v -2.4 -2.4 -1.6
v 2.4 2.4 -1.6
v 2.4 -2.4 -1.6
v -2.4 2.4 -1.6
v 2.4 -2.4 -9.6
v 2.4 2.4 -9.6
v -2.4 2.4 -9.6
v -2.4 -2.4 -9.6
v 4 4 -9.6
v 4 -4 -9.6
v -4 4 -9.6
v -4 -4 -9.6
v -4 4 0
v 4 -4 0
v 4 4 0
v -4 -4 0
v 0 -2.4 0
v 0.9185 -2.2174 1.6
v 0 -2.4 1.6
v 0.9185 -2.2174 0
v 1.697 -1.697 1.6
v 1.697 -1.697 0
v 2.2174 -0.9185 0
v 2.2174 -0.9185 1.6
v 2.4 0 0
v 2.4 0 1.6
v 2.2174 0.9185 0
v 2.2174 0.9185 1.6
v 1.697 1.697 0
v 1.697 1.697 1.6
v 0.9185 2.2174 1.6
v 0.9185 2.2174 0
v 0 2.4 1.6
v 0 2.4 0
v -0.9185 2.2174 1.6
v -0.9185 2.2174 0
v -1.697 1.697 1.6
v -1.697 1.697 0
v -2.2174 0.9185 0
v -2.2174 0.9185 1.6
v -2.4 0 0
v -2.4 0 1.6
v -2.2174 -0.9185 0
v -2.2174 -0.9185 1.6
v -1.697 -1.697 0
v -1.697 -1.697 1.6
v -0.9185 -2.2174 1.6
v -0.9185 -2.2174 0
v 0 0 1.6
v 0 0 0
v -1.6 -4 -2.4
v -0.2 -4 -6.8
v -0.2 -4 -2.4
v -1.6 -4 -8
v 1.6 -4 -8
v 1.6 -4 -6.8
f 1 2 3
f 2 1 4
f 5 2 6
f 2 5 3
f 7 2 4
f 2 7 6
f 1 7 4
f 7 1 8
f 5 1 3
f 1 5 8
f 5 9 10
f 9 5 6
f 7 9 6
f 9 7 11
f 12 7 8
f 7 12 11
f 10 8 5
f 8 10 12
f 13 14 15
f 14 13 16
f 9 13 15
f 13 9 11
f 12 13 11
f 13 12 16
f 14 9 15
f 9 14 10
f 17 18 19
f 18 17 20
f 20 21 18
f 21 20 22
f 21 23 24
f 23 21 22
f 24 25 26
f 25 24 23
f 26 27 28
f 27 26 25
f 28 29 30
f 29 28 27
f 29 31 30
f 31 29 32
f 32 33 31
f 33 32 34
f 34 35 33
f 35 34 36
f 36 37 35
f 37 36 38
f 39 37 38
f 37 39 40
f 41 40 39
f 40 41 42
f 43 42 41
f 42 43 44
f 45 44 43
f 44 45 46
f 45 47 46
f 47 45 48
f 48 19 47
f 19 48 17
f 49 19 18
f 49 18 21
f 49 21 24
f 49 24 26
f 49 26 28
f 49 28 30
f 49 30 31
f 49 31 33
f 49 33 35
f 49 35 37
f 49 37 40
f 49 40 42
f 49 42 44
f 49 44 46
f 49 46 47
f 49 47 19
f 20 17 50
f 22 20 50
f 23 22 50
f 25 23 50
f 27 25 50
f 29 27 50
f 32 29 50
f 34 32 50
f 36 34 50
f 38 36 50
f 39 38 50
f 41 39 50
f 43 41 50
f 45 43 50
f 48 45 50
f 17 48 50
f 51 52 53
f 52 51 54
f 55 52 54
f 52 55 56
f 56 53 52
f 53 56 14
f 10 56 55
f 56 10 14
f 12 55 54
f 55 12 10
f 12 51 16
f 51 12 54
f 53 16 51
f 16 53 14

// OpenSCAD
// file: ../p/4-4edge.scad
use <../lib.scad>
function ldraw_lib__4_4edge() = [
// 0 Circle 1.0
// 0 Name: 4-4edge.dat
// 0 Author: James Jessiman
// 0 !LDRAW_ORG Primitive UPDATE 2017-01
// 0 !LICENSE Licensed under CC BY 2.0 and CC BY 4.0 : see CAreadme.txt
// 
// 0 BFC CERTIFY CCW
  [0,"BFC","CERTIFY"],
  [0,"BFC","CCW"],
// 
// 0 !HISTORY 1998-12-15 [PTadmin] Official Update 1998-10
// 0 !HISTORY 2005-12-28 [PTadmin] Official Update 2005-01
// 0 !HISTORY 2007-06-24 [PTadmin] Header formatted for Contributor Agreement
// 0 !HISTORY 2008-07-01 [PTadmin] Official Update 2008-01
// 0 !HISTORY 2017-01-15 [Steffen] BFCed
// 0 !HISTORY 2017-12-30 [PTadmin] Official Update 2017-01
// 
// 
// 2 24 1 0 0 0.9239 0 0.3827
  [2,24,1,0,0,0.9239,0,0.3827],
// 2 24 0.9239 0 0.3827 0.7071 0 0.7071
  [2,24,0.9239,0,0.3827,0.7071,0,0.7071],
// 2 24 0.7071 0 0.7071 0.3827 0 0.9239
  [2,24,0.7071,0,0.7071,0.3827,0,0.9239],
// 2 24 0.3827 0 0.9239 0 0 1
  [2,24,0.3827,0,0.9239,0,0,1],
// 2 24 0 0 1 -0.3827 0 0.9239
  [2,24,0,0,1,-0.3827,0,0.9239],
// 2 24 -0.3827 0 0.9239 -0.7071 0 0.7071
  [2,24,-0.3827,0,0.9239,-0.7071,0,0.7071],
// 2 24 -0.7071 0 0.7071 -0.9239 0 0.3827
  [2,24,-0.7071,0,0.7071,-0.9239,0,0.3827],
// 2 24 -0.9239 0 0.3827 -1 0 -0
  [2,24,-0.9239,0,0.3827,-1,0,-0],
// 2 24 -1 0 -0 -0.9239 0 -0.3827
  [2,24,-1,0,-0,-0.9239,0,-0.3827],
// 2 24 -0.9239 0 -0.3827 -0.7071 0 -0.7071
  [2,24,-0.9239,0,-0.3827,-0.7071,0,-0.7071],
// 2 24 -0.7071 0 -0.7071 -0.3827 0 -0.9239
  [2,24,-0.7071,0,-0.7071,-0.3827,0,-0.9239],
// 2 24 -0.3827 0 -0.9239 0 0 -1
  [2,24,-0.3827,0,-0.9239,0,0,-1],
// 2 24 0 0 -1 0.3827 0 -0.9239
  [2,24,0,0,-1,0.3827,0,-0.9239],
// 2 24 0.3827 0 -0.9239 0.7071 0 -0.7071
  [2,24,0.3827,0,-0.9239,0.7071,0,-0.7071],
// 2 24 0.7071 0 -0.7071 0.9239 0 -0.3827
  [2,24,0.7071,0,-0.7071,0.9239,0,-0.3827],
// 2 24 0.9239 0 -0.3827 1 0 0
  [2,24,0.9239,0,-0.3827,1,0,0],
];
module ldraw_lib__4_4edge(step=0, col=false, unit=2/5, alt=false, line=0.2, solid=!$preview)
    makepoly(ldraw_lib__4_4edge(), step=step, col=col, unit=unit, alt=alt, line=line, solid=solid);
ldraw_lib__4_4edge(line=0.2);
// file: ../p/4-4disc.scad
use <../lib.scad>
function ldraw_lib__4_4disc() = [
// 0 Disc 1.0
// 0 Name: 4-4disc.dat
// 0 Author: James Jessiman
// 0 !LDRAW_ORG Primitive UPDATE 2002-02
// 0 !LICENSE Licensed under CC BY 2.0 and CC BY 4.0 : see CAreadme.txt
// 
// 0 BFC CERTIFY CCW
  [0,"BFC","CERTIFY"],
  [0,"BFC","CCW"],
// 
// 0 !HISTORY 1998-12-15 [PTadmin] Official Update 1998-10
// 0 !HISTORY 2002-03-23 [sbliss] Added BFC statement
// 0 !HISTORY 2002-04-25 [PTadmin] Official Update 2002-02
// 0 !HISTORY 2007-06-24 [PTadmin] Header formatted for Contributor Agreement
// 0 !HISTORY 2008-07-01 [PTadmin] Official Update 2008-01
// 
// 
// 3 16 0 0 0 1 0 0 0.9239 0 0.3827
  [3,16,0,0,0,1,0,0,0.9239,0,0.3827],
// 3 16 0 0 0 0.9239 0 0.3827 0.7071 0 0.7071
  [3,16,0,0,0,0.9239,0,0.3827,0.7071,0,0.7071],
// 3 16 0 0 0 0.7071 0 0.7071 0.3827 0 0.9239
  [3,16,0,0,0,0.7071,0,0.7071,0.3827,0,0.9239],
// 3 16 0 0 0 0.3827 0 0.9239 0 0 1
  [3,16,0,0,0,0.3827,0,0.9239,0,0,1],
// 3 16 0 0 0 0 0 1 -0.3827 0 0.9239
  [3,16,0,0,0,0,0,1,-0.3827,0,0.9239],
// 3 16 0 0 0 -0.3827 0 0.9239 -0.7071 0 0.7071
  [3,16,0,0,0,-0.3827,0,0.9239,-0.7071,0,0.7071],
// 3 16 0 0 0 -0.7071 0 0.7071 -0.9239 0 0.3827
  [3,16,0,0,0,-0.7071,0,0.7071,-0.9239,0,0.3827],
// 3 16 0 0 0 -0.9239 0 0.3827 -1 0 -0
  [3,16,0,0,0,-0.9239,0,0.3827,-1,0,-0],
// 3 16 0 0 0 -1 0 -0 -0.9239 0 -0.3827
  [3,16,0,0,0,-1,0,-0,-0.9239,0,-0.3827],
// 3 16 0 0 0 -0.9239 0 -0.3827 -0.7071 0 -0.7071
  [3,16,0,0,0,-0.9239,0,-0.3827,-0.7071,0,-0.7071],
// 3 16 0 0 0 -0.7071 0 -0.7071 -0.3827 0 -0.9239
  [3,16,0,0,0,-0.7071,0,-0.7071,-0.3827,0,-0.9239],
// 3 16 0 0 0 -0.3827 0 -0.9239 0 0 -1
  [3,16,0,0,0,-0.3827,0,-0.9239,0,0,-1],
// 3 16 0 0 0 0 0 -1 0.3827 0 -0.9239
  [3,16,0,0,0,0,0,-1,0.3827,0,-0.9239],
// 3 16 0 0 0 0.3827 0 -0.9239 0.7071 0 -0.7071
  [3,16,0,0,0,0.3827,0,-0.9239,0.7071,0,-0.7071],
// 3 16 0 0 0 0.7071 0 -0.7071 0.9239 0 -0.3827
  [3,16,0,0,0,0.7071,0,-0.7071,0.9239,0,-0.3827],
// 3 16 0 0 0 0.9239 0 -0.3827 1 0 0
  [3,16,0,0,0,0.9239,0,-0.3827,1,0,0],
// 0
];
module ldraw_lib__4_4disc(step=0, col=false, unit=2/5, alt=false, line=0.2, solid=!$preview)
    makepoly(ldraw_lib__4_4disc(), step=step, col=col, unit=unit, alt=alt, line=line, solid=solid);
ldraw_lib__4_4disc(line=0.2);
// file: ../p/4-4cyli.scad
use <../lib.scad>
$fa=1; $fs=0.2;
function ldraw_lib__4_4cyli(realsolid=false) = [
// 0 Cylinder 1.0
// 0 Name: 4-4cyli.dat
// 0 Author: James Jessiman
// 0 !LDRAW_ORG Primitive UPDATE 2005-01
// 0 !LICENSE Licensed under CC BY 2.0 and CC BY 4.0 : see CAreadme.txt
// 
// 0 BFC CERTIFY CCW
  [0,"BFC","CERTIFY"],
  [0,"BFC","CCW"],
// 
// 0 !HISTORY 1998-12-15 [PTadmin] Official Update 1998-10
// 0 !HISTORY 2002-03-23 [sbliss] Added BFC statement; merged headers from files in distributions LDraw 0.27 and Complete.
// 0 !HISTORY 2002-04-25 [PTadmin] Official Update 2002-02
// 0 !HISTORY 2004-12-14 [guyvivan] BFC CCW
// 0 !HISTORY 2005-12-28 [PTadmin] Official Update 2005-01
// 0 !HISTORY 2007-06-24 [PTadmin] Header formatted for Contributor Agreement
// 0 !HISTORY 2008-07-01 [PTadmin] Official Update 2008-01
// 
// 
// 4 16 1 1 0 0.9239 1 0.3827 0.9239 0 0.3827 1 0 0
  [4,16,1,1,0,0.9239,1,0.3827,0.9239,0,0.3827,1,0,0],
// 5 24 1 0 0 1 1 0 0.9239 0 0.3827 0.9239 0 -0.3827
  [5,24,1,0,0,1,1,0,0.9239,0,0.3827,0.9239,0,-0.3827],
// 4 16 0.9239 1 0.3827 0.7071 1 0.7071 0.7071 0 0.7071 0.9239 0 0.3827
  [4,16,0.9239,1,0.3827,0.7071,1,0.7071,0.7071,0,0.7071,0.9239,0,0.3827],
// 5 24 0.9239 0 0.3827 0.9239 1 0.3827 0.7071 0 0.7071 1 0 0
  [5,24,0.9239,0,0.3827,0.9239,1,0.3827,0.7071,0,0.7071,1,0,0],
// 4 16 0.7071 1 0.7071 0.3827 1 0.9239 0.3827 0 0.9239 0.7071 0 0.7071
  [4,16,0.7071,1,0.7071,0.3827,1,0.9239,0.3827,0,0.9239,0.7071,0,0.7071],
// 5 24 0.7071 0 0.7071 0.7071 1 0.7071 0.3827 0 0.9239 0.9239 0 0.3827
  [5,24,0.7071,0,0.7071,0.7071,1,0.7071,0.3827,0,0.9239,0.9239,0,0.3827],
// 4 16 0.3827 1 0.9239 0 1 1 0 0 1 0.3827 0 0.9239
  [4,16,0.3827,1,0.9239,0,1,1,0,0,1,0.3827,0,0.9239],
// 5 24 0.3827 0 0.9239 0.3827 1 0.9239 0 0 1 0.7071 0 0.7071
  [5,24,0.3827,0,0.9239,0.3827,1,0.9239,0,0,1,0.7071,0,0.7071],
// 4 16 0 1 1 -0.3827 1 0.9239 -0.3827 0 0.9239 0 0 1
  [4,16,0,1,1,-0.3827,1,0.9239,-0.3827,0,0.9239,0,0,1],
// 5 24 0 0 1 0 1 1 -0.3827 0 0.9239 0.3827 0 0.9239
  [5,24,0,0,1,0,1,1,-0.3827,0,0.9239,0.3827,0,0.9239],
// 4 16 -0.3827 1 0.9239 -0.7071 1 0.7071 -0.7071 0 0.7071 -0.3827 0 0.9239
  [4,16,-0.3827,1,0.9239,-0.7071,1,0.7071,-0.7071,0,0.7071,-0.3827,0,0.9239],
// 5 24 -0.3827 0 0.9239 -0.3827 1 0.9239 -0.7071 0 0.7071 0 0 1
  [5,24,-0.3827,0,0.9239,-0.3827,1,0.9239,-0.7071,0,0.7071,0,0,1],
// 4 16 -0.7071 1 0.7071 -0.9239 1 0.3827 -0.9239 0 0.3827 -0.7071 0 0.7071
  [4,16,-0.7071,1,0.7071,-0.9239,1,0.3827,-0.9239,0,0.3827,-0.7071,0,0.7071],
// 5 24 -0.7071 0 0.7071 -0.7071 1 0.7071 -0.9239 0 0.3827 -0.3827 0 0.9239
  [5,24,-0.7071,0,0.7071,-0.7071,1,0.7071,-0.9239,0,0.3827,-0.3827,0,0.9239],
// 4 16 -0.9239 1 0.3827 -1 1 0 -1 0 0 -0.9239 0 0.3827
  [4,16,-0.9239,1,0.3827,-1,1,0,-1,0,0,-0.9239,0,0.3827],
// 5 24 -0.9239 0 0.3827 -0.9239 1 0.3827 -1 0 0 -0.7071 0 0.7071
  [5,24,-0.9239,0,0.3827,-0.9239,1,0.3827,-1,0,0,-0.7071,0,0.7071],
// 4 16 -1 1 0 -0.9239 1 -0.3827 -0.9239 0 -0.3827 -1 0 0
  [4,16,-1,1,0,-0.9239,1,-0.3827,-0.9239,0,-0.3827,-1,0,0],
// 5 24 -1 0 0 -1 1 0 -0.9239 0 -0.3827 -0.9239 0 0.3827
  [5,24,-1,0,0,-1,1,0,-0.9239,0,-0.3827,-0.9239,0,0.3827],
// 4 16 -0.9239 1 -0.3827 -0.7071 1 -0.7071 -0.7071 0 -0.7071 -0.9239 0 -0.3827
  [4,16,-0.9239,1,-0.3827,-0.7071,1,-0.7071,-0.7071,0,-0.7071,-0.9239,0,-0.3827],
// 5 24 -0.9239 0 -0.3827 -0.9239 1 -0.3827 -0.7071 0 -0.7071 -1 0 0
  [5,24,-0.9239,0,-0.3827,-0.9239,1,-0.3827,-0.7071,0,-0.7071,-1,0,0],
// 4 16 -0.7071 1 -0.7071 -0.3827 1 -0.9239 -0.3827 0 -0.9239 -0.7071 0 -0.7071
  [4,16,-0.7071,1,-0.7071,-0.3827,1,-0.9239,-0.3827,0,-0.9239,-0.7071,0,-0.7071],
// 5 24 -0.7071 0 -0.7071 -0.7071 1 -0.7071 -0.3827 0 -0.9239 -0.9239 0 -0.3827
  [5,24,-0.7071,0,-0.7071,-0.7071,1,-0.7071,-0.3827,0,-0.9239,-0.9239,0,-0.3827],
// 4 16 -0.3827 1 -0.9239 0 1 -1 0 0 -1 -0.3827 0 -0.9239
  [4,16,-0.3827,1,-0.9239,0,1,-1,0,0,-1,-0.3827,0,-0.9239],
// 5 24 -0.3827 0 -0.9239 -0.3827 1 -0.9239 0 0 -1 -0.7071 0 -0.7071
  [5,24,-0.3827,0,-0.9239,-0.3827,1,-0.9239,0,0,-1,-0.7071,0,-0.7071],
// 4 16 0 1 -1 0.3827 1 -0.9239 0.3827 0 -0.9239 0 0 -1
  [4,16,0,1,-1,0.3827,1,-0.9239,0.3827,0,-0.9239,0,0,-1],
// 5 24 0 0 -1 0 1 -1 0.3827 0 -0.9239 -0.3827 0 -0.9239
  [5,24,0,0,-1,0,1,-1,0.3827,0,-0.9239,-0.3827,0,-0.9239],
// 4 16 0.3827 1 -0.9239 0.7071 1 -0.7071 0.7071 0 -0.7071 0.3827 0 -0.9239
  [4,16,0.3827,1,-0.9239,0.7071,1,-0.7071,0.7071,0,-0.7071,0.3827,0,-0.9239],
// 5 24 0.3827 0 -0.9239 0.3827 1 -0.9239 0.7071 0 -0.7071 0 0 -1
  [5,24,0.3827,0,-0.9239,0.3827,1,-0.9239,0.7071,0,-0.7071,0,0,-1],
// 4 16 0.7071 1 -0.7071 0.9239 1 -0.3827 0.9239 0 -0.3827 0.7071 0 -0.7071
  [4,16,0.7071,1,-0.7071,0.9239,1,-0.3827,0.9239,0,-0.3827,0.7071,0,-0.7071],
// 5 24 0.7071 0 -0.7071 0.7071 1 -0.7071 0.9239 0 -0.3827 0.3827 0 -0.9239
  [5,24,0.7071,0,-0.7071,0.7071,1,-0.7071,0.9239,0,-0.3827,0.3827,0,-0.9239],
// 4 16 0.9239 1 -0.3827 1 1 0 1 0 0 0.9239 0 -0.3827
  [4,16,0.9239,1,-0.3827,1,1,0,1,0,0,0.9239,0,-0.3827],
// 5 24 0.9239 0 -0.3827 0.9239 1 -0.3827 1 0 0 0.7071 0 -0.7071
  [5,24,0.9239,0,-0.3827,0.9239,1,-0.3827,1,0,0,0.7071,0,-0.7071],
// 0
];
module ldraw_lib__4_4cyli(step=0, col=false, unit=2/5, alt=false, line=0.2, solid=!$preview)
    makepoly(ldraw_lib__4_4cyli(solid), step=step, col=col, unit=unit, alt=alt, line=line, solid=solid);
ldraw_lib__4_4cyli(line=0.2);
// file: ../p/stud.scad
use <../lib.scad>
use <4-4cyli.scad>
use <4-4disc.scad>
use <4-4edge.scad>
function ldraw_lib__stud() = [
// 0 Stud
// 0 Name: stud.dat
// 0 Author: James Jessiman
// 0 !LDRAW_ORG Primitive UPDATE 2012-01
// 0 !LICENSE Licensed under CC BY 4.0 : see CAreadme.txt
// 
// 0 BFC CERTIFY CCW
  [0,"BFC","CERTIFY"],
  [0,"BFC","CCW"],
// 
// 0 !HISTORY 2002-04-04 [sbliss] Modified for BFC compliance
// 0 !HISTORY 2002-04-25 [PTadmin] Official Update 2002-02
// 0 !HISTORY 2007-06-24 [PTadmin] Header formatted for Contributor Agreement
// 0 !HISTORY 2008-07-01 [PTadmin] Official Update 2008-01
// 0 !HISTORY 2012-02-16 [Philo] Changed to CCW
// 0 !HISTORY 2012-03-30 [PTadmin] Official Update 2012-01
// 
// 
// 1 16 0 0 0 6 0 0 0 1 0 0 0 6 4-4edge.dat
  [1,16,0,0,0,6,0,0,0,1,0,0,0,6, ldraw_lib__4_4edge()],
// 1 16 0 -4 0 6 0 0 0 1 0 0 0 6 4-4edge.dat
  [1,16,0,-4,0,6,0,0,0,1,0,0,0,6, ldraw_lib__4_4edge()],
// 1 16 0 0 0 6 0 0 0 -4 0 0 0 6 4-4cyli.dat
  [1,16,0,0,0,6,0,0,0,-4,0,0,0,6, ldraw_lib__4_4cyli()],
// 1 16 0 -4 0 6 0 0 0 1 0 0 0 6 4-4disc.dat
  [1,16,0,-4,0,6,0,0,0,1,0,0,0,6, ldraw_lib__4_4disc()],
  [-1,16,0,0,0,6,0,0,0,-1,0,0,0,6, ldraw_lib__4_4disc()],
];
module ldraw_lib__stud(step=0, col=false, unit=2/5, alt=false, line=0.2, solid=!$preview)
    makepoly(ldraw_lib__stud(), step=step, col=col, unit=unit, alt=alt, line=line, solid=solid);
ldraw_lib__stud(line=0.2);
// file: ../p/box5.scad
use <../lib.scad>
function ldraw_lib__box5() = [
// 0 Box with 5 Faces and All Edges
// 0 Name: box5.dat
// 0 Author: James Jessiman
// 0 !LDRAW_ORG Primitive UPDATE 2012-01
// 0 !LICENSE Licensed under CC BY 2.0 and CC BY 4.0 : see CAreadme.txt
// 
// 0 BFC CERTIFY CCW
  [0,"BFC","CERTIFY"],
  [0,"BFC","CCW"],
// 
// 0 !HISTORY 2002-04-03 [sbliss] Modified for BFC compliance
// 0 !HISTORY 2002-04-25 [PTadmin] Official Update 2002-02
// 0 !HISTORY 2007-06-24 [PTadmin] Header formatted for Contributor Agreement
// 0 !HISTORY 2008-07-01 [PTadmin] Official Update 2008-01
// 0 !HISTORY 2012-02-16 [Philo] Changed to CCW
// 0 !HISTORY 2012-03-30 [PTadmin] Official Update 2012-01
// 
// 
// 2 24 1 1 1 -1 1 1
  [2,24,1,1,1,-1,1,1],
// 2 24 -1 1 1 -1 1 -1
  [2,24,-1,1,1,-1,1,-1],
// 2 24 -1 1 -1 1 1 -1
  [2,24,-1,1,-1,1,1,-1],
// 2 24 1 1 -1 1 1 1
  [2,24,1,1,-1,1,1,1],
// 2 24 1 0 1 -1 0 1
  [2,24,1,0,1,-1,0,1],
// 2 24 -1 0 1 -1 0 -1
  [2,24,-1,0,1,-1,0,-1],
// 2 24 -1 0 -1 1 0 -1
  [2,24,-1,0,-1,1,0,-1],
// 2 24 1 0 -1 1 0 1
  [2,24,1,0,-1,1,0,1],
// 2 24 1 0 1 1 1 1
  [2,24,1,0,1,1,1,1],
// 2 24 -1 0 1 -1 1 1
  [2,24,-1,0,1,-1,1,1],
// 2 24 1 0 -1 1 1 -1
  [2,24,1,0,-1,1,1,-1],
// 2 24 -1 0 -1 -1 1 -1
  [2,24,-1,0,-1,-1,1,-1],
// 4 16 -1 1 1 1 1 1 1 1 -1 -1 1 -1
  [4,16,-1,1,1,1,1,1,1,1,-1,-1,1,-1],
// 4 16 -1 1 1 -1 0 1 1 0 1 1 1 1
  [4,16,-1,1,1,-1,0,1,1,0,1,1,1,1],
// 4 16 -1 1 -1 -1 0 -1 -1 0 1 -1 1 1
  [4,16,-1,1,-1,-1,0,-1,-1,0,1,-1,1,1],
// 4 16 1 1 -1 1 0 -1 -1 0 -1 -1 1 -1
  [4,16,1,1,-1,1,0,-1,-1,0,-1,-1,1,-1],
// 4 16 1 1 1 1 0 1 1 0 -1 1 1 -1
  [4,16,1,1,1,1,0,1,1,0,-1,1,1,-1],
];
makepoly(ldraw_lib__box5(), line=0.2);
// file: ../p/box4t.scad
use <../lib.scad>
function ldraw_lib__box4t() = [
// 0 Box with 4 Adjacent Faces and All Edges
// 0 Name: box4t.dat
// 0 Author: Tore Eriksson [Tore_Eriksson]
// 0 !LDRAW_ORG Primitive UPDATE 2003-02
// 0 !LICENSE Licensed under CC BY 2.0 and CC BY 4.0 : see CAreadme.txt
// 
// 0 BFC CERTIFY CCW
  [0,"BFC","CERTIFY"],
  [0,"BFC","CCW"],
// 
// 0 !HISTORY 1997-09-29 [PTadmin] Official Update 1997-15
// 0 !HISTORY 2002-08-31 [izanette] Modified with WINDZ for BFC compliance
// 0 !HISTORY 2003-08-01 [PTadmin] Official Update 2003-02
// 0 !HISTORY 2007-06-24 [PTadmin] Header formatted for Contributor Agreement
// 0 !HISTORY 2008-07-01 [PTadmin] Official Update 2008-01
// 
// 
// 2 24 1 1 1 -1 1 1
  [2,24,1,1,1,-1,1,1],
// 2 24 -1 1 1 -1 1 -1
  [2,24,-1,1,1,-1,1,-1],
// 2 24 -1 1 -1 1 1 -1
  [2,24,-1,1,-1,1,1,-1],
// 2 24 1 1 -1 1 1 1
  [2,24,1,1,-1,1,1,1],
// 2 24 1 0 1 -1 0 1
  [2,24,1,0,1,-1,0,1],
// 2 24 -1 0 1 -1 0 -1
  [2,24,-1,0,1,-1,0,-1],
// 2 24 -1 0 -1 1 0 -1
  [2,24,-1,0,-1,1,0,-1],
// 2 24 1 0 -1 1 0 1
  [2,24,1,0,-1,1,0,1],
// 2 24 1 0 1 1 1 1
  [2,24,1,0,1,1,1,1],
// 2 24 -1 0 1 -1 1 1
  [2,24,-1,0,1,-1,1,1],
// 2 24 1 0 -1 1 1 -1
  [2,24,1,0,-1,1,1,-1],
// 2 24 -1 0 -1 -1 1 -1
  [2,24,-1,0,-1,-1,1,-1],
// 4 16 1 1 1 1 1 -1 -1 1 -1 -1 1 1
  [4,16,1,1,1,1,1,-1,-1,1,-1,-1,1,1],
// 4 16 1 1 1 -1 1 1 -1 0 1 1 0 1
  [4,16,1,1,1,-1,1,1,-1,0,1,1,0,1],
// 4 16 -1 1 1 -1 1 -1 -1 0 -1 -1 0 1
  [4,16,-1,1,1,-1,1,-1,-1,0,-1,-1,0,1],
// 0 4 16 -1 1 -1 -1 0 -1 1 0 -1 1 1 -1
// 4 16 1 1 -1 1 1 1 1 0 1 1 0 -1
  [4,16,1,1,-1,1,1,1,1,0,1,1,0,-1],
// 0
];
makepoly(ldraw_lib__box4t(), line=0.2);
// file: s/3005s01.scad
use <../../lib.scad>
use <../../p/box4t.scad>
use <../../p/box5.scad>
use <../../p/stud.scad>
function ldraw_lib__s__3005s01() = [
// 0 ~Brick  1 x  1 without Front Face
// 0 Name: s\3005s01.dat
// 0 Author: John Riley [jriley]
// 0 !LDRAW_ORG Subpart UPDATE 2004-01
// 0 !LICENSE Licensed under CC BY 2.0 and CC BY 4.0 : see CAreadme.txt
// 
// 0 BFC CERTIFY CCW
  [0,"BFC","CERTIFY"],
  [0,"BFC","CCW"],
// 
// 0 !HISTORY 2003-09-07 [jriley] BFCed & Subfiled
// 0 !HISTORY 2004-03-02 [PTadmin] Official Update 2004-01
// 0 !HISTORY 2007-08-29 [PTadmin] Header formatted for Contributor Agreement
// 0 !HISTORY 2008-07-01 [PTadmin] Official Update 2008-01
// 
// 
// 0 BFC INVERTNEXT
  [0,"BFC","INVERTNEXT"],
// 1 16 0 24 0 0 0 6 0 -20 0 -6 0 0 box5.dat
  [1,16,0,24,0,0,0,6,0,-20,0,-6,0,0, ldraw_lib__box5()],
// 4 16 10 24 -10 6 24 -6 6 24 6 10 24 10
  [4,16,10,24,-10,6,24,-6,6,24,6,10,24,10],
// 4 16 10 24 10 6 24 6 -6 24 6 -10 24 10
  [4,16,10,24,10,6,24,6,-6,24,6,-10,24,10],
// 4 16 -10 24 10 -6 24 6 -6 24 -6 -10 24 -10
  [4,16,-10,24,10,-6,24,6,-6,24,-6,-10,24,-10],
// 4 16 -10 24 -10 -6 24 -6 6 24 -6 10 24 -10
  [4,16,-10,24,-10,-6,24,-6,6,24,-6,10,24,-10],
// 1 16 0 24 0 10 0 0 0 -24 0 0 0 10 box4t.dat
  [1,16,0,24,0,10,0,0,0,-24,0,0,0,10, ldraw_lib__box4t()],
// 1 16 0 0 0 0 0 1 0 1 0 -1 0 0 stud.dat
  [1,16,0,0,0,0,0,1,0,1,0,-1,0,0, ldraw_lib__stud()],
// 0
];
module ldraw_lib__s__3005s01(step=0, col=false, unit=2/5, alt=false, line=0.2, solid=!$preview)
    makepoly(ldraw_lib__s__3005s01(), step=step, col=col, unit=unit, alt=alt, line=line, solid=solid);
ldraw_lib__s__3005s01(line=0.2);
// main file
use <../lib.scad>
use <s/3005s01.scad>
function ldraw_lib__3005pvl() = [
// 0 Brick  1 x  1 with Lightblue "L" Pattern
// 0 Name: 3005pvl.dat
// 0 Author: Tore Eriksson [Tore_Eriksson]
// 0 !LDRAW_ORG Part UPDATE 2025-09
// 0 !LICENSE Licensed under CC BY 4.0 : see CAreadme.txt
// 
// 0 BFC CERTIFY CCW
  [0,"BFC","CERTIFY"],
  [0,"BFC","CCW"],
// 
// 0 !KEYWORDS BrickLink 3005ptLb, letters, numbers, Rebrickable 3005pr9934
// 0 !KEYWORDS Set 988
// 
// 0 !HISTORY 2004-04-22 [PTadmin] Official Update 2004-02
// 0 !HISTORY 2007-05-11 [PTadmin] Header formatted for Contributor Agreement
// 0 !HISTORY 2008-07-01 [PTadmin] Official Update 2008-01
// 0 !HISTORY 2025-09-27 [OrionP] Changed winding to CCW
// 0 !HISTORY 2025-09-29 [OrionP] Official Update 2025-09
// 
// 1 16 0 0 0 1 0 0 0 1 0 0 0 1 s\3005s01.dat
  [1,16,0,0,0,1,0,0,0,1,0,0,0,1, ldraw_lib__s__3005s01()],
// 
// 4 9 -4 20 -10 -0.5 17 -10 -0.5 6 -10 -4 6 -10
  [4,9,-4,20,-10,-0.5,17,-10,-0.5,6,-10,-4,6,-10],
// 4 9 4 20 -10 4 17 -10 -0.5 17 -10 -4 20 -10
  [4,9,4,20,-10,4,17,-10,-0.5,17,-10,-4,20,-10],
// 4 16 -0.5 17 -10 4 17 -10 10 0 -10 -0.5 6 -10
  [4,16,-0.5,17,-10,4,17,-10,10,0,-10,-0.5,6,-10],
// 4 16 10 0 -10 4 17 -10 4 20 -10 10 24 -10
  [4,16,10,0,-10,4,17,-10,4,20,-10,10,24,-10],
// 4 16 10 24 -10 4 20 -10 -4 20 -10 -10 24 -10
  [4,16,10,24,-10,4,20,-10,-4,20,-10,-10,24,-10],
// 4 16 -10 24 -10 -4 20 -10 -4 6 -10 -10 0 -10
  [4,16,-10,24,-10,-4,20,-10,-4,6,-10,-10,0,-10],
// 4 16 -4 6 -10 -0.5 6 -10 10 0 -10 -10 0 -10
  [4,16,-4,6,-10,-0.5,6,-10,10,0,-10,-10,0,-10],
// 0
];
module ldraw_lib__3005pvl(step=0, col=false, unit=2/5, alt=false, line=0.2, solid=!$preview)
    makepoly(ldraw_lib__3005pvl(), step=step, col=col, unit=unit, alt=alt, line=line, solid=solid);
ldraw_lib__3005pvl(line=0.2);
